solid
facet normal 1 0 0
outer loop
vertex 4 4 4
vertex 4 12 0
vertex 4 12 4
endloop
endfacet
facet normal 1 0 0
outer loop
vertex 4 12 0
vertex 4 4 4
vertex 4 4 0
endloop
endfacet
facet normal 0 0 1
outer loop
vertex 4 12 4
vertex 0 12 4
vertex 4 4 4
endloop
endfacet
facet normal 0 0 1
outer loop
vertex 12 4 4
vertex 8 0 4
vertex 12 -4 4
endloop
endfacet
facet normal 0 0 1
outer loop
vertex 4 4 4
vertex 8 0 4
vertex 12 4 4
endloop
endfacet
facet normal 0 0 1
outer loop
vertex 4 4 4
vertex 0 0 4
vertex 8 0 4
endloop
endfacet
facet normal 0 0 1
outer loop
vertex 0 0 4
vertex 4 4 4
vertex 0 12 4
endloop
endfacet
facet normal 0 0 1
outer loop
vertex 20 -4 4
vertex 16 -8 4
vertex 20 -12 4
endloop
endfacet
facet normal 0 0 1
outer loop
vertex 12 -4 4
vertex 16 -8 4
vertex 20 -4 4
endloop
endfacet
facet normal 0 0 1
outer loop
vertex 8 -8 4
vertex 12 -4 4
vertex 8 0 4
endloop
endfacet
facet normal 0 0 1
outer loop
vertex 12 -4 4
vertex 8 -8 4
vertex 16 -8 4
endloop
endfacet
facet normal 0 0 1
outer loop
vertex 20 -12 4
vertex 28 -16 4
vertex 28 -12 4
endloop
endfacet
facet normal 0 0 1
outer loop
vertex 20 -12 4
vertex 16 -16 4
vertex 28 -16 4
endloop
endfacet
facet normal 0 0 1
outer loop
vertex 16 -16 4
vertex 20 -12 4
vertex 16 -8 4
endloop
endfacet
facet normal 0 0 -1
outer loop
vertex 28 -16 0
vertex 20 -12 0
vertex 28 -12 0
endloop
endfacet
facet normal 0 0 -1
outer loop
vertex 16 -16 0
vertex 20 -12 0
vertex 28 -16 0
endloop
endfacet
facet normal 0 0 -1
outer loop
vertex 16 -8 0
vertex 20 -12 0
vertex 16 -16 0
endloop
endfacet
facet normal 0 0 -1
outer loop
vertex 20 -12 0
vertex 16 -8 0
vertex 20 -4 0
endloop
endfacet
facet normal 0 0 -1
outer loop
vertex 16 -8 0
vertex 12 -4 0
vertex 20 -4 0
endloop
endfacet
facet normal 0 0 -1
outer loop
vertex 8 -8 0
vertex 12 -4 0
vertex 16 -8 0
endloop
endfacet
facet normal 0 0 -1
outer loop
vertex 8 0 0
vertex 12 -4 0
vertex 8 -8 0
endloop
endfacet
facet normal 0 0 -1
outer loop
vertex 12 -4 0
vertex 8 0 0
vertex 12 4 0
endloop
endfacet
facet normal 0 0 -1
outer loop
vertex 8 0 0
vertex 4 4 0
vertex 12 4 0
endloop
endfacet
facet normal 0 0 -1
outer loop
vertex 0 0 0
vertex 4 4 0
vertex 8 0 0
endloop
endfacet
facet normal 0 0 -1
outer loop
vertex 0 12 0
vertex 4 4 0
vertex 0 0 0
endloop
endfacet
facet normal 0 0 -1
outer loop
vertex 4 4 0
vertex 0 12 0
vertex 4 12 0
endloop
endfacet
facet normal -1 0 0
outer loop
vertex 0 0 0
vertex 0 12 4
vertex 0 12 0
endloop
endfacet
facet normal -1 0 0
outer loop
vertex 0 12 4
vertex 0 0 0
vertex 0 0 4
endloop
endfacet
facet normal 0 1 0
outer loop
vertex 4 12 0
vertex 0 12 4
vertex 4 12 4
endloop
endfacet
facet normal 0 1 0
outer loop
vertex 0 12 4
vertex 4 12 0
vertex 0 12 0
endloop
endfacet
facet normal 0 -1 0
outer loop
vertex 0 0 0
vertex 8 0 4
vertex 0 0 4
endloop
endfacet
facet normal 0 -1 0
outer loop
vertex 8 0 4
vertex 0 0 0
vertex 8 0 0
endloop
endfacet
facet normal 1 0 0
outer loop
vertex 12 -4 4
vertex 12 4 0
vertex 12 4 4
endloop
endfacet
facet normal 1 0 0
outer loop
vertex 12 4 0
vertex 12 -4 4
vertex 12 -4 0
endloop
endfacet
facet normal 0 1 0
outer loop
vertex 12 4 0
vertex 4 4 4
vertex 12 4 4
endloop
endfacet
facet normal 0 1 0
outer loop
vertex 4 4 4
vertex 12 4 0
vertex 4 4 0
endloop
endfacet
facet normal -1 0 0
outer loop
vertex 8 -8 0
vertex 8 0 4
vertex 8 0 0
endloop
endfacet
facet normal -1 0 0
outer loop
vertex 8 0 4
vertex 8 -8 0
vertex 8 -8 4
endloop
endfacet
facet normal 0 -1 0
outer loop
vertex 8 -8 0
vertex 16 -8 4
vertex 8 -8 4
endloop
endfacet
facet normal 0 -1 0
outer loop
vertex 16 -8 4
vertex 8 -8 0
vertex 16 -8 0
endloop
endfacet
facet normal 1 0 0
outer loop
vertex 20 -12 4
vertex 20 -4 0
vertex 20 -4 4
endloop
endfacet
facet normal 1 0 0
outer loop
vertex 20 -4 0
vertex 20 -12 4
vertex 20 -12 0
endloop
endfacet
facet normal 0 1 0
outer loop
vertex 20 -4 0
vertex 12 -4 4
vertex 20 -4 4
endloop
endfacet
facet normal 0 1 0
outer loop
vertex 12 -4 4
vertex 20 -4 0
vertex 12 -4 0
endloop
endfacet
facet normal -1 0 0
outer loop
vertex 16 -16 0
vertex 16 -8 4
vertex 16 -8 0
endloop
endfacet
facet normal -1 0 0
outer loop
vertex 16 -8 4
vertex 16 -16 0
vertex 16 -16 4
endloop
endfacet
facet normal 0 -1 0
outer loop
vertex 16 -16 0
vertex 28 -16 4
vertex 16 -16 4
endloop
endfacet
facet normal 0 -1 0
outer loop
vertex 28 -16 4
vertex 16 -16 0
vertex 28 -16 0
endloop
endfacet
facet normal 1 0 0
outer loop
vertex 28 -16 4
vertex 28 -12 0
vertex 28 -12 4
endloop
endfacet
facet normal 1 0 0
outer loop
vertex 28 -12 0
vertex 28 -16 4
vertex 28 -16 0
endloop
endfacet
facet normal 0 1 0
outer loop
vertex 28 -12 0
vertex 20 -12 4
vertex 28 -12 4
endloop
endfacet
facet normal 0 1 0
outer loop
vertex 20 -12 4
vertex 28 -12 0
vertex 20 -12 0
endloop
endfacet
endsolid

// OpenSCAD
//Width of stick
w = 12;
//Height of stick
h = 4;
//Depth of stick
z = 4;
//Num of stick
num_sticks = 6; // Barrabes = 6

logo(w,h,z,num_sticks);

module logo(a=2, b=2,h=2,n=4) {
    for(i = [0:1:n-1]){
        ii = floor(i/2);
        if(i%2 ==0){
            translate([ii*(a-b), ii*(b-a)])
                cube([b,a,h]);
        }else{
            translate([ii*(a-b), ii*(b-a)])
                cube([a,b,h]);
        }
    }
}
